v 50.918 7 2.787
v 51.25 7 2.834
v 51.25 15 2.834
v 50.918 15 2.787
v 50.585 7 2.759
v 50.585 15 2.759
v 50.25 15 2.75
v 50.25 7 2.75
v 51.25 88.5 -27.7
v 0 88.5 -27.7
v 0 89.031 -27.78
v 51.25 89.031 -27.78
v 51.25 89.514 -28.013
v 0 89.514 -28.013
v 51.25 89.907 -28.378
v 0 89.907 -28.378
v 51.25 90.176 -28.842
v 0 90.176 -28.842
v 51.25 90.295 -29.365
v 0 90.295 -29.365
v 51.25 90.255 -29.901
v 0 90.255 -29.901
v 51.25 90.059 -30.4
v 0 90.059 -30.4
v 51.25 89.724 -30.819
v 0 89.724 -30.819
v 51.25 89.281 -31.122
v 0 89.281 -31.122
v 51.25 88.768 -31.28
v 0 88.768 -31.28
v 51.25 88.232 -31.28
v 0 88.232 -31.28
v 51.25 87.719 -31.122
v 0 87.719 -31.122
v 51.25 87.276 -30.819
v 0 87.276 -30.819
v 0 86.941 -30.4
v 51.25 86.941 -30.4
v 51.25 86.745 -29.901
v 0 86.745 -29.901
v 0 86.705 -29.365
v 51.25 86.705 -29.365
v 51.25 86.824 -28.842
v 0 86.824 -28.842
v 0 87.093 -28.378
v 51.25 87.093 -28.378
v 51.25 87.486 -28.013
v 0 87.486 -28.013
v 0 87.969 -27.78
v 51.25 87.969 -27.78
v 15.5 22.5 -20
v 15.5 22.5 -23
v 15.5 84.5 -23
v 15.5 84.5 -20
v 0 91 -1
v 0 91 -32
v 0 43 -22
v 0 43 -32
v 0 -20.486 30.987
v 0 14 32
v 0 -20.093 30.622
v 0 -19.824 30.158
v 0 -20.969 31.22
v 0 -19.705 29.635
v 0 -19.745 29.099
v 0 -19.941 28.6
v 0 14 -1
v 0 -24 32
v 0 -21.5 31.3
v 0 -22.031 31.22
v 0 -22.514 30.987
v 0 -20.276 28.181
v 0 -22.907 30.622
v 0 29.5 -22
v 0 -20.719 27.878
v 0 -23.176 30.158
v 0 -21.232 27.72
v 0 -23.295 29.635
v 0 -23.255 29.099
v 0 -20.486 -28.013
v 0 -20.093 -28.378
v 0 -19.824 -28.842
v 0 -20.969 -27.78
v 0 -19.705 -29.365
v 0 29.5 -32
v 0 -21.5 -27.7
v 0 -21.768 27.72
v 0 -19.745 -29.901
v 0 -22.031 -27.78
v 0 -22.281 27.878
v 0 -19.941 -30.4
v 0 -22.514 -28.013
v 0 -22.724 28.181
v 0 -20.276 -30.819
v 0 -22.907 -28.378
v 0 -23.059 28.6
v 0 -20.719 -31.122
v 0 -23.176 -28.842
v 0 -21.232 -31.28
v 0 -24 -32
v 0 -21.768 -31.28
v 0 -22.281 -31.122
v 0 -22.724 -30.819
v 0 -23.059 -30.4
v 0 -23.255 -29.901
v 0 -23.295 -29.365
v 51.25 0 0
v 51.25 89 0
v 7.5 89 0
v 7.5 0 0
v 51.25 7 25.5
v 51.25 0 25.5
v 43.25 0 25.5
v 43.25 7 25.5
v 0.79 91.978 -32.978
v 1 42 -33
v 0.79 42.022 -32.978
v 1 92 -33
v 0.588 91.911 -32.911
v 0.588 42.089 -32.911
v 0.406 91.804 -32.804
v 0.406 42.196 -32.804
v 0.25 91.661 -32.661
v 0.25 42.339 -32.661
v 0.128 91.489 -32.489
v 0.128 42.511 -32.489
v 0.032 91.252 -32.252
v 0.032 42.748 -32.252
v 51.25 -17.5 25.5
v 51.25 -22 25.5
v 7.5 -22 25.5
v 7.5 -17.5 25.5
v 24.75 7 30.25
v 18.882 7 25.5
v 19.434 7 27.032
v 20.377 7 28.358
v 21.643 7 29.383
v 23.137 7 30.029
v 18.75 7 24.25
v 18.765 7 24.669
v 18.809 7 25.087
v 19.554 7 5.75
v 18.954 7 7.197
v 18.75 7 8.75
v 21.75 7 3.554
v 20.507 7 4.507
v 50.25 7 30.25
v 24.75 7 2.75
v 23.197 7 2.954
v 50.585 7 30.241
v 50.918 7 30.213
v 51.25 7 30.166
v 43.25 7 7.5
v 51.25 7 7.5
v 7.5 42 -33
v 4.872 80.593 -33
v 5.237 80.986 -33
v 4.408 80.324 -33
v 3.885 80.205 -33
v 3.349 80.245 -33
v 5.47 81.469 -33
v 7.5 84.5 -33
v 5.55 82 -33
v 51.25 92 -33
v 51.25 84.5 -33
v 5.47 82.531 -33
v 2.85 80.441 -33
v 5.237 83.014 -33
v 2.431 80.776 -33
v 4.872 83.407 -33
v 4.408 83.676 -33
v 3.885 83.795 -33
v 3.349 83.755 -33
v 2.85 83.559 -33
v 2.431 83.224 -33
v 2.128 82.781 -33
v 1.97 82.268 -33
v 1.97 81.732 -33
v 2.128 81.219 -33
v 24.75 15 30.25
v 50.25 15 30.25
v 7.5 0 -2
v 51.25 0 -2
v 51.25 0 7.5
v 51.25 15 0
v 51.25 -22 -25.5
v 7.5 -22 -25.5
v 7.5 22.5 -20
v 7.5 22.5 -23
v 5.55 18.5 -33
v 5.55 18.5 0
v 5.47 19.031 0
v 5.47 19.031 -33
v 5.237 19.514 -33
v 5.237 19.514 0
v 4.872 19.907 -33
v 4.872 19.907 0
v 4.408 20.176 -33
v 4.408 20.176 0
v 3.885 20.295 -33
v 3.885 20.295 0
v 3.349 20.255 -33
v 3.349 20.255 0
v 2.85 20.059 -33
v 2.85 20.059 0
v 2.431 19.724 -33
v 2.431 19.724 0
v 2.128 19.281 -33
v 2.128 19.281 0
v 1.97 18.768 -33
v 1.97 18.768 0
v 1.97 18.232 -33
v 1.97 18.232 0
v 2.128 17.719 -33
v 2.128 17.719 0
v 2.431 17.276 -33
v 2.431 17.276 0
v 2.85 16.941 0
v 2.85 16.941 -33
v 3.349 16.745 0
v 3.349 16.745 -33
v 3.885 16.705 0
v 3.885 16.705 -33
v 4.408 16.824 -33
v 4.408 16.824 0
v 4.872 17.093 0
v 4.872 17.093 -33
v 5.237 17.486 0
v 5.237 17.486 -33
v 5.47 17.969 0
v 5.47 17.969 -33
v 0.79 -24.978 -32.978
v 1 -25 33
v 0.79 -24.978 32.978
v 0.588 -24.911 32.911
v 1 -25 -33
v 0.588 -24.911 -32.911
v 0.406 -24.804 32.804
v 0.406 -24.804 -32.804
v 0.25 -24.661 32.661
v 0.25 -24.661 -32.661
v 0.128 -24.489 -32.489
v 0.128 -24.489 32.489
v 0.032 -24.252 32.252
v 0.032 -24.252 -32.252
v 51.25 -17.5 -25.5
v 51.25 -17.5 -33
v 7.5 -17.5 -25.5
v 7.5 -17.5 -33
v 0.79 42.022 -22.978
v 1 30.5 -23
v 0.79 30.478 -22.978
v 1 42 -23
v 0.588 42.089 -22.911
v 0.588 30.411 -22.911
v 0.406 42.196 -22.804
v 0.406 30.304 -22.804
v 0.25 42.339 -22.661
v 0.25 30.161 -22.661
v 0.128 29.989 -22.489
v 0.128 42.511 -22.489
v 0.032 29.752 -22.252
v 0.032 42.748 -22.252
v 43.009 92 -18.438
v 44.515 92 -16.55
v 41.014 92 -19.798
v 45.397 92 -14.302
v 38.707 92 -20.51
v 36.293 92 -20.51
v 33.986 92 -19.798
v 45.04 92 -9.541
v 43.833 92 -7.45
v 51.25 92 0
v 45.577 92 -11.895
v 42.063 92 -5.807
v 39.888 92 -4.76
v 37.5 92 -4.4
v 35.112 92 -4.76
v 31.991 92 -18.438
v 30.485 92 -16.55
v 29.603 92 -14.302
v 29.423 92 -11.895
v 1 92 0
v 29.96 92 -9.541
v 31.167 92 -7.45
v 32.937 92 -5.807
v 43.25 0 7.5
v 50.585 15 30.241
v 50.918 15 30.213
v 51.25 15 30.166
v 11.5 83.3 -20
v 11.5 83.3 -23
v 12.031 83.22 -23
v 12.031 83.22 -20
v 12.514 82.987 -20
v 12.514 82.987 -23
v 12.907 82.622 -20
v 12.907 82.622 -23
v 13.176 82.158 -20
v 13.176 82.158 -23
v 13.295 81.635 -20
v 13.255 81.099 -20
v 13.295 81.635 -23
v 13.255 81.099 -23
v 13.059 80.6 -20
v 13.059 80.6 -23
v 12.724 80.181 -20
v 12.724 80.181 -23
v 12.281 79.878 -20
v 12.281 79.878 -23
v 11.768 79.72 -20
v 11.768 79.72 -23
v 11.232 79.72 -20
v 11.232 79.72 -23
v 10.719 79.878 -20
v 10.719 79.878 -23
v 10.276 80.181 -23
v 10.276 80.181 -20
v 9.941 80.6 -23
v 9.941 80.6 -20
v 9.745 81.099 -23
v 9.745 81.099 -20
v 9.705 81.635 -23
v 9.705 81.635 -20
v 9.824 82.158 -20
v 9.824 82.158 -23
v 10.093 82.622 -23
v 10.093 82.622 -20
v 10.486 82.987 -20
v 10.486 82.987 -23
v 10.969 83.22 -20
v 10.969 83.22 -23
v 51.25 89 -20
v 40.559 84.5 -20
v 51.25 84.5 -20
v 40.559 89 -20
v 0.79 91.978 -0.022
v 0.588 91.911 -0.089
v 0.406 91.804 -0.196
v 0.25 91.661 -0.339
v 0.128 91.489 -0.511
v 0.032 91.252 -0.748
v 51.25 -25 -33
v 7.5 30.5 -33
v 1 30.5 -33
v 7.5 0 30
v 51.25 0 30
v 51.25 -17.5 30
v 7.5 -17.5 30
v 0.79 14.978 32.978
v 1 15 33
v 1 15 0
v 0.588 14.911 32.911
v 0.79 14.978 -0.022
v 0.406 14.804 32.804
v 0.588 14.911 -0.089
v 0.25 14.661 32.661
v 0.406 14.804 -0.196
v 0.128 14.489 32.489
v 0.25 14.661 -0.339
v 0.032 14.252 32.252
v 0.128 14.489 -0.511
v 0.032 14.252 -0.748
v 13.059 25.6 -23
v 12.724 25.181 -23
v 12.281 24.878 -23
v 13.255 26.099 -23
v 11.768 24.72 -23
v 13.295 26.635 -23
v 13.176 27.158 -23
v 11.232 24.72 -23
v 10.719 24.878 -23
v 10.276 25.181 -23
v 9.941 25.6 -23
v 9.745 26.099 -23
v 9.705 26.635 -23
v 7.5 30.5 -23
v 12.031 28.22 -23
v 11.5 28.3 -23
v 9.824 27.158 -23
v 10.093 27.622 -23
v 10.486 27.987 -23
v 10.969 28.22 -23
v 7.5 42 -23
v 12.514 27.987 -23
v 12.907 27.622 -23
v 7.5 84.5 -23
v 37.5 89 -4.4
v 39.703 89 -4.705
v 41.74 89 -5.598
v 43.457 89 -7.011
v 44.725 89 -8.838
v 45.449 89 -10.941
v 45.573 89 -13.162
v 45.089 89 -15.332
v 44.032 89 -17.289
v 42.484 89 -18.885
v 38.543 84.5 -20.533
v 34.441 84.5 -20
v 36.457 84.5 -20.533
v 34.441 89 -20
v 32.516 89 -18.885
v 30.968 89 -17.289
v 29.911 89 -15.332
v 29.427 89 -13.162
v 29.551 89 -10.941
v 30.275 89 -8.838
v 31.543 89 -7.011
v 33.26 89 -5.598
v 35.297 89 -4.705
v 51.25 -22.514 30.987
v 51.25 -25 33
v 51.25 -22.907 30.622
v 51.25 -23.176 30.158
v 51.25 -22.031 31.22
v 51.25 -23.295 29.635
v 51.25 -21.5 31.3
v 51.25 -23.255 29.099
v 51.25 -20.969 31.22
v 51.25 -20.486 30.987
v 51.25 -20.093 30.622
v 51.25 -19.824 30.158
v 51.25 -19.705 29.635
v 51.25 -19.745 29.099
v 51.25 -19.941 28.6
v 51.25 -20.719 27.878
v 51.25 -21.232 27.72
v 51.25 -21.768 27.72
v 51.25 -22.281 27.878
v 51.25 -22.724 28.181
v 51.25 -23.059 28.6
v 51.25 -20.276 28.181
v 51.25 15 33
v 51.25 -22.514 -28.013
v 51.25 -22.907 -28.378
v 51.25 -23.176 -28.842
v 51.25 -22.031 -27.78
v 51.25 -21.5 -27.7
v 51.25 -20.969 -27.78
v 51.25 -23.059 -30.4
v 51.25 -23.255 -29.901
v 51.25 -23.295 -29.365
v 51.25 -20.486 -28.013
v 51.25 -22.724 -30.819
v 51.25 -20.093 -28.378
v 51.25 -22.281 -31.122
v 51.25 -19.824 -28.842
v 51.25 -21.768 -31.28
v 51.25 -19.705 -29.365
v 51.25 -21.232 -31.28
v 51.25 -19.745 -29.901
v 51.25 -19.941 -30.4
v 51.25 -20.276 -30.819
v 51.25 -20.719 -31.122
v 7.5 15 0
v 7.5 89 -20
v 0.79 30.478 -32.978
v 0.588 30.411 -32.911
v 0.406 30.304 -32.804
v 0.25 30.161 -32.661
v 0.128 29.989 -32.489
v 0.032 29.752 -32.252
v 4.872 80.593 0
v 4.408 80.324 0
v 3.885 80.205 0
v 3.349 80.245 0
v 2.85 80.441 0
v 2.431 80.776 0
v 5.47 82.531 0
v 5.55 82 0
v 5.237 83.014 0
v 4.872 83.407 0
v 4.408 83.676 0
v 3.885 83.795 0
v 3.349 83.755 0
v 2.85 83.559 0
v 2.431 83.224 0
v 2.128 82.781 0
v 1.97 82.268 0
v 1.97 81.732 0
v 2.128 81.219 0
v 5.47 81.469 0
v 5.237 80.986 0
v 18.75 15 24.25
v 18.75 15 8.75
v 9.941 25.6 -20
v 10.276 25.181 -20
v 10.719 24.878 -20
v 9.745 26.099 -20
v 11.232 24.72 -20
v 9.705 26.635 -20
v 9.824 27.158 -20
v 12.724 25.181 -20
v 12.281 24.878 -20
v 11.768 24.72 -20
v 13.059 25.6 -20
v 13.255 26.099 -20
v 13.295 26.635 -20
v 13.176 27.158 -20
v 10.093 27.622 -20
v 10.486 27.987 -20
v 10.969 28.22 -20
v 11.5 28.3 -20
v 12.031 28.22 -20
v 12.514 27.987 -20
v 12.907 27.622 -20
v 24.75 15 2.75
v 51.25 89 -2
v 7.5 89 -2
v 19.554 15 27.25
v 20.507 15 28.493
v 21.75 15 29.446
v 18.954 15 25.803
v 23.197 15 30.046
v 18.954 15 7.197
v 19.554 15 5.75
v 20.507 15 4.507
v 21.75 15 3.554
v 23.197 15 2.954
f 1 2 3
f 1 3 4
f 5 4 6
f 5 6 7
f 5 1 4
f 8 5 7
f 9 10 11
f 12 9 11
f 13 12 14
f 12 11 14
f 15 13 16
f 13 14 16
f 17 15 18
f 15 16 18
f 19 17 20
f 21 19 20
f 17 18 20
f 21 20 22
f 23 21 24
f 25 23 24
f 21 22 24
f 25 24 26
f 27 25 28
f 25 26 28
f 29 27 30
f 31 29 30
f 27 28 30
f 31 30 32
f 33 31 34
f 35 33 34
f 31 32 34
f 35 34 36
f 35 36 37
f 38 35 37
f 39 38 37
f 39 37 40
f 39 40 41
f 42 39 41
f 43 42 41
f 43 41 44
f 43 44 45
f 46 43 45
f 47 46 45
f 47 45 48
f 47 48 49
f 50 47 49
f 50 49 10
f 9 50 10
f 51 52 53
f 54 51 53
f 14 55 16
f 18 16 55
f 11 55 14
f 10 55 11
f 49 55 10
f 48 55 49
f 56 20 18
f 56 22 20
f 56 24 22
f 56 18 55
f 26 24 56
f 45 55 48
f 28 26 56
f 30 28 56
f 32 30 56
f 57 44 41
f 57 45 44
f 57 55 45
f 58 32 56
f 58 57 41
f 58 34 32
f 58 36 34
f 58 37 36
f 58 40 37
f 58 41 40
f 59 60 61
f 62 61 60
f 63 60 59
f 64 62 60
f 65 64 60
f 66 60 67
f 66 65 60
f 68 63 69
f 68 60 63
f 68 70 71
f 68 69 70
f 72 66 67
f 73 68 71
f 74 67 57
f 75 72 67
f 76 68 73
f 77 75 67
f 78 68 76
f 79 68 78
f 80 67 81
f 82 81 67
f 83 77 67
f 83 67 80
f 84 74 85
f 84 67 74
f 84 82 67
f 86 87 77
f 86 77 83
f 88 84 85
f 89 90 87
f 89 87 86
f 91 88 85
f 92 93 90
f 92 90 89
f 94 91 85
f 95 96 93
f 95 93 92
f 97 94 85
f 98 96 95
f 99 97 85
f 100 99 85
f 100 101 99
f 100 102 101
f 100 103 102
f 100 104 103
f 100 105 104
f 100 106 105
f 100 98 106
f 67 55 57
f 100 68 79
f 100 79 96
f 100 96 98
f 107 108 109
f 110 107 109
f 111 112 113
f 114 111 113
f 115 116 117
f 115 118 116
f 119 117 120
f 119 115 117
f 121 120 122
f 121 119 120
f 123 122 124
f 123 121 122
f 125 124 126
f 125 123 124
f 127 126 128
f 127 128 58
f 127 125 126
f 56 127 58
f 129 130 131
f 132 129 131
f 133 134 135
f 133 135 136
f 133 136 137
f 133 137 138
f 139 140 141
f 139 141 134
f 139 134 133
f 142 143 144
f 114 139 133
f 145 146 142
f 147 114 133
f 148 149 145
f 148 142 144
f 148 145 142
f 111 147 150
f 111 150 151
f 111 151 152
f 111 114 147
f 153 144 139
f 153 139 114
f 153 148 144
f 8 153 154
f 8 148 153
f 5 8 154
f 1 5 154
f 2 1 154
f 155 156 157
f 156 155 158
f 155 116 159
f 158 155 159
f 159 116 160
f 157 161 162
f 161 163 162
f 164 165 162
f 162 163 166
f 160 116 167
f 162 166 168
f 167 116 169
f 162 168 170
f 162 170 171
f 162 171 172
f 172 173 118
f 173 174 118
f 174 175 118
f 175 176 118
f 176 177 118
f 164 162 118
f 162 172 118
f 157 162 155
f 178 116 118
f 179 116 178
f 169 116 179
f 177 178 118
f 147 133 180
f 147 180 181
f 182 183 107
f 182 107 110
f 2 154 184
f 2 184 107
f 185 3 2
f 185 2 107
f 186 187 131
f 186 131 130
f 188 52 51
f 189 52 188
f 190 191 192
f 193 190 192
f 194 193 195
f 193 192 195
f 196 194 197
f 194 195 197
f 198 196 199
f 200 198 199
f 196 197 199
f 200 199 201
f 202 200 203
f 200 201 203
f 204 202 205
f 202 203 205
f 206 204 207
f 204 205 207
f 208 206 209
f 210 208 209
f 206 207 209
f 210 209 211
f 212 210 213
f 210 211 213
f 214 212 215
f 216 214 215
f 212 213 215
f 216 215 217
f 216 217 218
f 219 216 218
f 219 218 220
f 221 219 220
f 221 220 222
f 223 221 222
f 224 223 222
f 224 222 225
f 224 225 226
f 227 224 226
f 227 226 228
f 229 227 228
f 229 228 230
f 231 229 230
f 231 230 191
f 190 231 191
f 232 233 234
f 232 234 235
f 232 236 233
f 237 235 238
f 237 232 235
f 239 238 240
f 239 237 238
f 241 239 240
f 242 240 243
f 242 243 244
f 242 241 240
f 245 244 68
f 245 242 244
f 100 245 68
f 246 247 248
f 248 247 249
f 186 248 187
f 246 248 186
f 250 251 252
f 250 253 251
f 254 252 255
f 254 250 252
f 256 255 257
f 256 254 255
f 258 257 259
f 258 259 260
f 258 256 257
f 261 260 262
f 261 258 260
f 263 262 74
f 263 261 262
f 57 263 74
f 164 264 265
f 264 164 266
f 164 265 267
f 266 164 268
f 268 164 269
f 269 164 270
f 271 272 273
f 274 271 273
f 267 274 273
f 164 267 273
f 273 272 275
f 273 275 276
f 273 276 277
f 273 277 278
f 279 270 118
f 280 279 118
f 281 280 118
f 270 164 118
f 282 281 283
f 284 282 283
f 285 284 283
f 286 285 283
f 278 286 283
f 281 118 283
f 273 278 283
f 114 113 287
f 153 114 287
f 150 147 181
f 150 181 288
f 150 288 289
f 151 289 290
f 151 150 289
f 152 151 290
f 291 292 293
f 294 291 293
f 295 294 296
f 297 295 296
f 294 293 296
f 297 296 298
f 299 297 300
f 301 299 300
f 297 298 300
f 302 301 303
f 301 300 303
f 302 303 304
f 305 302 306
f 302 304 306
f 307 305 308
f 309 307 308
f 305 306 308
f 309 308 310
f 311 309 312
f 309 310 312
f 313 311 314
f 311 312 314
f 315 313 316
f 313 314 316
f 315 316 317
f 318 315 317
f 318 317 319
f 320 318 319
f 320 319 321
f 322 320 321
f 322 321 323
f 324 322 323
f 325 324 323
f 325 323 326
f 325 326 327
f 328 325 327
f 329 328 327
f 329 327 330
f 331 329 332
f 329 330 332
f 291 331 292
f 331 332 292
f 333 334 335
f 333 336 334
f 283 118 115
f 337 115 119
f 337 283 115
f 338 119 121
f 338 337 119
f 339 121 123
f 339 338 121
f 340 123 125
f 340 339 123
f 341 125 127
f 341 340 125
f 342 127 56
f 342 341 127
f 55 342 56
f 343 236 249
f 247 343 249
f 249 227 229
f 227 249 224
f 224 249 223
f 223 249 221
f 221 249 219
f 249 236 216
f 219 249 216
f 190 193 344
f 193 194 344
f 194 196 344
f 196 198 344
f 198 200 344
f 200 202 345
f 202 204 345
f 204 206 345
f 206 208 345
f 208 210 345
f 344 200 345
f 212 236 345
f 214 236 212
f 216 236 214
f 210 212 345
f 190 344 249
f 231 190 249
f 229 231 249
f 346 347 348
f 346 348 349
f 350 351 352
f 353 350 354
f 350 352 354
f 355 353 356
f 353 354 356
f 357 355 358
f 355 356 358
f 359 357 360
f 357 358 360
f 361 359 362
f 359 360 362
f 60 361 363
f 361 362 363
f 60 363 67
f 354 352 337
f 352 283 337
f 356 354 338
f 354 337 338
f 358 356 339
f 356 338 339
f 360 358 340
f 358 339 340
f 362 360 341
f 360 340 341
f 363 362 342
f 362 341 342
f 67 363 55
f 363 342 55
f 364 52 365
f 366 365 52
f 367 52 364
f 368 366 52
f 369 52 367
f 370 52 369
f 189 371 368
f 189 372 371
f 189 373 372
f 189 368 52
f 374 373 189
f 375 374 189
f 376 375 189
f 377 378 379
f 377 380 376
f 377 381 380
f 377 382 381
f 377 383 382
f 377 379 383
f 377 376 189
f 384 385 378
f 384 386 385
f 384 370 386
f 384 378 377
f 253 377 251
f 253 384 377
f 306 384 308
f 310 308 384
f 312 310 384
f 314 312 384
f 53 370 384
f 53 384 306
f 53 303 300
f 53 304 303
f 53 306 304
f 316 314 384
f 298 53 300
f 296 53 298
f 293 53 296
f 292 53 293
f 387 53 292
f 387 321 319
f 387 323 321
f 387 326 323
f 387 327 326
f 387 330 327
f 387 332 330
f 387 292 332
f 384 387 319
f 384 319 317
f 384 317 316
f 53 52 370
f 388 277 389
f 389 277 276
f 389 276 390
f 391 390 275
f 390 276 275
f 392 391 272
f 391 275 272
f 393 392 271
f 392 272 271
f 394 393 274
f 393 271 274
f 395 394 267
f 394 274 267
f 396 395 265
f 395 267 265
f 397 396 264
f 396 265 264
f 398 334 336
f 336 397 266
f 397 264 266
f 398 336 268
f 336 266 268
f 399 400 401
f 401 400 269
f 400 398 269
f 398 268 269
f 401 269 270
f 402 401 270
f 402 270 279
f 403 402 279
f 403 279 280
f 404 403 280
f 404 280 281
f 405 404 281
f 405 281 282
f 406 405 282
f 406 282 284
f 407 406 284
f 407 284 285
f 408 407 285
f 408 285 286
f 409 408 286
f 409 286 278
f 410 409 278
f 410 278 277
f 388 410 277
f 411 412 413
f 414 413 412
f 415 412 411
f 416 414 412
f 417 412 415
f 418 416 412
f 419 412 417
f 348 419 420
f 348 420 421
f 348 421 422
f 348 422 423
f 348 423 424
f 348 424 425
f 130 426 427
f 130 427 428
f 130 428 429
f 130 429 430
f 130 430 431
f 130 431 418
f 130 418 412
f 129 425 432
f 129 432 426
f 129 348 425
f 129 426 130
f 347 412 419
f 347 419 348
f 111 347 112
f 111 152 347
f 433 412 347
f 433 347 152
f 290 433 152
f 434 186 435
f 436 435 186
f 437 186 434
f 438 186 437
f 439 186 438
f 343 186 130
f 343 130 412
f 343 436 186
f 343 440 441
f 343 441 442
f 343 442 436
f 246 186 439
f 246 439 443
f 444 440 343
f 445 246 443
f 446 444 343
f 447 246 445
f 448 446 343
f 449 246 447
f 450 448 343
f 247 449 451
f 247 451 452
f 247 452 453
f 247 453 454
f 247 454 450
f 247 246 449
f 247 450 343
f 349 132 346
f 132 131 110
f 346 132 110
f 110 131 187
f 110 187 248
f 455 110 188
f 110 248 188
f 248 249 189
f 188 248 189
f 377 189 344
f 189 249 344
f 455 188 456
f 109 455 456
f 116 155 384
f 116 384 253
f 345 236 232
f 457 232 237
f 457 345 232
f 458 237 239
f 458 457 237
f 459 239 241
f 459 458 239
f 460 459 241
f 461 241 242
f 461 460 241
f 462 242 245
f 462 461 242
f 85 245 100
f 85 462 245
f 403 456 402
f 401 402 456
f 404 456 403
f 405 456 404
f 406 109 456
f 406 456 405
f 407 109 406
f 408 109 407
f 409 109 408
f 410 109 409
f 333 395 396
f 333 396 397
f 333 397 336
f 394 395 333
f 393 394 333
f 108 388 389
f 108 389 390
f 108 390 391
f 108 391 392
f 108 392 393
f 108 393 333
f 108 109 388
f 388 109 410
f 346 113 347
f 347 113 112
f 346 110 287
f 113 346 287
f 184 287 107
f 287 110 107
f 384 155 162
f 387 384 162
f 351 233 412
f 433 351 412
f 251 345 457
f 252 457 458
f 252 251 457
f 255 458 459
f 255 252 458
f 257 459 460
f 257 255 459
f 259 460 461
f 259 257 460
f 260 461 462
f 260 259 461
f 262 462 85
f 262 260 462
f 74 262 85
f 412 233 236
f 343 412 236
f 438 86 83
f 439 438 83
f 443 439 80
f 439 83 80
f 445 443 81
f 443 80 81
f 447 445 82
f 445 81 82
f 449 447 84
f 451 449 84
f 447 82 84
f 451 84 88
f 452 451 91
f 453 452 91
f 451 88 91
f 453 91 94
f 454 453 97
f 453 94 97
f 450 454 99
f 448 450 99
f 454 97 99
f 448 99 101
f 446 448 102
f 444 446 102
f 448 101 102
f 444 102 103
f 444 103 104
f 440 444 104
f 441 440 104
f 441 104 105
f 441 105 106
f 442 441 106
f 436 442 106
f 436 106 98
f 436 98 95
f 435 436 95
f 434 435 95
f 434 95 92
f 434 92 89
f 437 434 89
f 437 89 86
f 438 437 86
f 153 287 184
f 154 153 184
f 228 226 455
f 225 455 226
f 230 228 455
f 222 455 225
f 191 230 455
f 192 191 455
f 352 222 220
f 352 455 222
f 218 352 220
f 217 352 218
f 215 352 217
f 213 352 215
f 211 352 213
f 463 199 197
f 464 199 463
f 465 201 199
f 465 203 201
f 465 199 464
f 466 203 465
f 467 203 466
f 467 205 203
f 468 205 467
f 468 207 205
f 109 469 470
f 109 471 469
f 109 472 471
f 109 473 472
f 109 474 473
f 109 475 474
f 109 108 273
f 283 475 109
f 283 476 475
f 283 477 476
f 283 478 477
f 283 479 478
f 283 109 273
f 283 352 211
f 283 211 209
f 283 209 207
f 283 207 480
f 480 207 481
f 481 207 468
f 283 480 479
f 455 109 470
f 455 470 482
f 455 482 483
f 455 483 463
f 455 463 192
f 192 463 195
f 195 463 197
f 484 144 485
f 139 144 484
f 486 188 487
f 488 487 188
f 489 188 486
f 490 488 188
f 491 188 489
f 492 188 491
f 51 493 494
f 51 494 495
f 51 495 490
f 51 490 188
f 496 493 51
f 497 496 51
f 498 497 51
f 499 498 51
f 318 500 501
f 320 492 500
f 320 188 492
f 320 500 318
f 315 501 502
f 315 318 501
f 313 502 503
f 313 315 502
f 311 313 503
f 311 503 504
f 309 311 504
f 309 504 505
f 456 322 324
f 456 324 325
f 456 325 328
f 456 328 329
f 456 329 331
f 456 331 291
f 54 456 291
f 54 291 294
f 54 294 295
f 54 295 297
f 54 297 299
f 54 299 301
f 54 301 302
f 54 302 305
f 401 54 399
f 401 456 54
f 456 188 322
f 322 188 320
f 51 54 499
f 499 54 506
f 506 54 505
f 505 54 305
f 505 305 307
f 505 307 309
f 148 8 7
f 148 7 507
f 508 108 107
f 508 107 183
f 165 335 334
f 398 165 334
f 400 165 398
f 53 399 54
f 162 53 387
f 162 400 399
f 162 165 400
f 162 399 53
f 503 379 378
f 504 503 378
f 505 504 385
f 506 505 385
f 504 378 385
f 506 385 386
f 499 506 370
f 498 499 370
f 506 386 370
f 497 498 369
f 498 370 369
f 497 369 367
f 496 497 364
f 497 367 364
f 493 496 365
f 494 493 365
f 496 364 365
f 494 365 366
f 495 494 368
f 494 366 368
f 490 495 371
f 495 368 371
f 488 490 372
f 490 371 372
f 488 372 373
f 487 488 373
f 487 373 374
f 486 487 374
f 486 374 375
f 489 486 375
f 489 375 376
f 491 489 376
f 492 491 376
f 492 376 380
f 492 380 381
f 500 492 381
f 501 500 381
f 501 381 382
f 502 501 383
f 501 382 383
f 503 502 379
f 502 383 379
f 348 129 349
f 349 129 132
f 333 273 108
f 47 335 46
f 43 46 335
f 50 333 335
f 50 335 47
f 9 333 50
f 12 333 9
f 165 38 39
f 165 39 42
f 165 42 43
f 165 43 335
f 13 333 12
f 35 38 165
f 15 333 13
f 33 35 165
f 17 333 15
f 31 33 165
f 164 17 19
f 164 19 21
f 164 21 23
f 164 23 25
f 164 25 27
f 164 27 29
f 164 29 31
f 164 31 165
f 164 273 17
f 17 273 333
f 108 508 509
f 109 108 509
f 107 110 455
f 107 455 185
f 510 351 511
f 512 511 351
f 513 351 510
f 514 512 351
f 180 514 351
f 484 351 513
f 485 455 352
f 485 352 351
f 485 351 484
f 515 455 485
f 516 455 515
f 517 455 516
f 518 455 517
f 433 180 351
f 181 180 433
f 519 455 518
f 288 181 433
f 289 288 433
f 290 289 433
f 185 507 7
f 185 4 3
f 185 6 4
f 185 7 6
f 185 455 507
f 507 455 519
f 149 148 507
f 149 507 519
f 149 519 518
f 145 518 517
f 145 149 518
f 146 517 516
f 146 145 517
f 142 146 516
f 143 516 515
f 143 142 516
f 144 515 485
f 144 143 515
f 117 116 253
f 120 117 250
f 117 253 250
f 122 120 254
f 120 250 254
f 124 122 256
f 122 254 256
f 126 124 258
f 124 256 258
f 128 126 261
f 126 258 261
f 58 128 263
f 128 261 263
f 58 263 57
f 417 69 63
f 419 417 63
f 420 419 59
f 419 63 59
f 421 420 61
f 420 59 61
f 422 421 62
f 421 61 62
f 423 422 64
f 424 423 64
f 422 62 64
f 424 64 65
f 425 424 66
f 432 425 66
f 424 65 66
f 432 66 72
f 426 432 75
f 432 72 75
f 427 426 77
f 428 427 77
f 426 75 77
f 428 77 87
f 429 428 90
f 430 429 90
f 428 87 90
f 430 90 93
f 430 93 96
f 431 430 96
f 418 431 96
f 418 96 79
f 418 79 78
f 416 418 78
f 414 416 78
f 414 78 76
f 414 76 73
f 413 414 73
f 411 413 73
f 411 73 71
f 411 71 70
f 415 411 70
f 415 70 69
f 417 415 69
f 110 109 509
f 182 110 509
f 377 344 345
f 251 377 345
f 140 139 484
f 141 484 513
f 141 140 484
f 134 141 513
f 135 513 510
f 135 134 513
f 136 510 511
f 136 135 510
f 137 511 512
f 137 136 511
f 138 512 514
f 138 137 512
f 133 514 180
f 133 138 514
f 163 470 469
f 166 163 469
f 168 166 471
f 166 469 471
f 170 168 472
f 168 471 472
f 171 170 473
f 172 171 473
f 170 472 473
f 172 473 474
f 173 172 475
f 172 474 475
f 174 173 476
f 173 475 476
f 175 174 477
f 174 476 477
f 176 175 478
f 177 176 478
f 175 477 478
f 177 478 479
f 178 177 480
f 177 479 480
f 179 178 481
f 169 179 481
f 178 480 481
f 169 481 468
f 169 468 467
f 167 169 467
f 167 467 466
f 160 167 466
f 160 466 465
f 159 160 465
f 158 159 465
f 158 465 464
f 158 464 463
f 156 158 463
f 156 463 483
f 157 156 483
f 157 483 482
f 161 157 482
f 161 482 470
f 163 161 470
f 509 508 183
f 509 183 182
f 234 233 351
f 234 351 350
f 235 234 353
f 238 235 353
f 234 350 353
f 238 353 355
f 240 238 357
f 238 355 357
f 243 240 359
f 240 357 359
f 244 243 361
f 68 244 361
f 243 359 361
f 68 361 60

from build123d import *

# Parameters (mm, degrees)
SKETCH_1_W           = 33
SKETCH_1_H           = 25
SKETCH_1_W_2         = 23
SKETCH_1_H_2         = 117
SKETCH_1_W_3         = 10
EXTRUDE_1_DEPTH      = 77
SKETCH_2_W           = 62
SKETCH_2_H           = 62
CUT_EXTRUDE_1_DEPTH  = 10
SKETCH_3_R           = 8.1
CUT_EXTRUDE_2_DEPTH  = 10
SKETCH_4_W           = 62
SKETCH_4_H           = 40
CUT_EXTRUDE_3_DEPTH  = 58.5
SKETCH_5_W           = 77
SKETCH_5_H           = 33
EXTRUDE_2_DEPTH      = 15
EXTRUDE_3_DEPTH      = 7
SKETCH_7_W           = 62
SKETCH_7_H           = 66.5
CUT_EXTRUDE_4_DEPTH  = 20
SKETCH_8_W           = 62
SKETCH_8_H           = 2
EXTRUDE_4_DEPTH      = 89
SKETCH_9_R           = 1.8
CUT_EXTRUDE_5_DEPTH  = 125.426685241
SKETCH_10_R          = 1.8
CUT_EXTRUDE_6_DEPTH  = 125.426685241
SKETCH_12_R          = 1.8
CUT_EXTRUDE_7_DEPTH  = 3
SKETCH_13_W          = 7.5
SKETCH_13_H          = 11.5
CUT_EXTRUDE_8_DEPTH  = 10
CUT_EXTRUDE_9_DEPTH  = 25.75
SKETCH_17_W          = 43.75
SKETCH_17_H          = 51
CUT_EXTRUDE_11_DEPTH = 4.5
SKETCH_18_W          = 43.75
SKETCH_18_H          = 17.5
CUT_EXTRUDE_12_DEPTH = 4.5
SKETCH_19_W          = 35.75
SKETCH_19_H          = 62
CUT_EXTRUDE_13_DEPTH = 3
FILLET_1_R           = 1


with BuildPart() as part:
    # Sketch 1 → Extrude 1 (new body)
    with BuildSketch(Plane(origin=(0, 0, 0), x_dir=(0, 0, -1), z_dir=(1, 0, 0))):
        with Locations((-16.5, -12.5)):
            Rectangle(SKETCH_1_W, SKETCH_1_H)
        with Locations((11.5, 33.5)):
            Rectangle(SKETCH_1_W_2, SKETCH_1_H_2)
        with Locations((28, 33.5)):
            Rectangle(SKETCH_1_W_3, SKETCH_1_H_2)
    extrude(amount=EXTRUDE_1_DEPTH)

    # Sketch 2 → Cut-Extrude 1 (cut)
    with BuildSketch(Plane(origin=(0, 0, -33), x_dir=(-1, 0, 0), z_dir=(0, 0, -1))):
        with Locations((-38.5, 53.5)):
            Rectangle(SKETCH_2_W, SKETCH_2_H)
    extrude(amount=-CUT_EXTRUDE_1_DEPTH, mode=Mode.SUBTRACT)

    # Sketch 3 → Cut-Extrude 2 (cut)
    with BuildSketch(Plane(origin=(0, 92, 0), x_dir=(1, 0, 0), z_dir=(0, 1, 0))):
        with Locations(Location((37.5, 12.5, 0), (0, 0, 270))):
            Circle(SKETCH_3_R)
    extrude(amount=-CUT_EXTRUDE_2_DEPTH, mode=Mode.SUBTRACT)

    # Sketch 4 → Cut-Extrude 3 (cut)
    with BuildSketch(Plane(origin=(0, 0, -33), x_dir=(-1, 0, 0), z_dir=(0, 0, -1))):
        with Locations((-38.5, 2.5)):
            Rectangle(SKETCH_4_W, SKETCH_4_H)
    extrude(amount=-CUT_EXTRUDE_3_DEPTH, mode=Mode.SUBTRACT)

    # Sketch 5 → Extrude 2 (add)
    with BuildSketch(Plane(origin=(0, 0, 0), x_dir=(1, 0, 0), z_dir=(0, 1, 0))):
        with Locations((38.5, -16.5)):
            Rectangle(SKETCH_5_W, SKETCH_5_H)
        with BuildLine():
            Line((50.25, -2.75), (24.75, -2.75))
            ThreePointArc((24.75, -2.75), (20.507359313, -4.507359313), (18.75, -8.75))
            Line((18.75, -8.75), (18.75, -24.25))
            ThreePointArc((18.75, -24.25), (20.507359313, -28.492640687), (24.75, -30.25))
            Line((24.75, -30.25), (50.25, -30.25))
            ThreePointArc((50.25, -30.25), (54.492640687, -28.492640687), (56.25, -24.25))
            Line((56.25, -24.25), (56.25, -8.75))
            ThreePointArc((56.25, -8.75), (54.492640687, -4.507359313), (50.25, -2.75))
        make_face(mode=Mode.SUBTRACT)
    extrude(amount=EXTRUDE_2_DEPTH)

    # Sketch 6 → Extrude 3 (add)
    with BuildSketch(Plane(origin=(0, 0, 0), x_dir=(1, 0, 0), z_dir=(0, 1, 0))):
        with BuildLine():
            Line((18.881652703, -25.5), (43.25, -25.5))
            Line((43.25, -25.5), (43.25, -7.5))
            Line((43.25, -7.5), (43.25, -2.75))
            Line((43.25, -2.75), (24.75, -2.75))
            ThreePointArc((24.75, -2.75), (20.507359313, -4.507359313), (18.75, -8.75))
            Line((18.75, -8.75), (18.75, -24.25))
            ThreePointArc((18.75, -24.25), (18.783003947, -24.878456927), (18.881652703, -25.5))
        make_face()
        with BuildLine():
            Line((24.75, -30.25), (43.25, -30.25))
            Line((43.25, -30.25), (43.25, -25.5))
            Line((43.25, -25.5), (18.881652703, -25.5))
            ThreePointArc((18.881652703, -25.5), (20.975082782, -28.913689527), (24.75, -30.25))
        make_face()
        with BuildLine():
            Line((43.25, -25.5), (43.25, -30.25))
            Line((43.25, -30.25), (50.25, -30.25))
            ThreePointArc((50.25, -30.25), (50.751757562, -30.228983137), (51.25, -30.166079783))
            Line((51.25, -30.166079783), (51.25, -25.5))
            Line((51.25, -25.5), (43.25, -25.5))
        make_face()
        with BuildLine():
            Line((51.25, -7.5), (51.25, -25.5))
            Line((51.25, -25.5), (56.118347297, -25.5))
            ThreePointArc((56.118347297, -25.5), (56.216996053, -24.878456927), (56.25, -24.25))
            Line((56.25, -24.25), (56.25, -8.75))
            ThreePointArc((56.25, -8.75), (54.832575695, -4.877016654), (51.25, -2.833920217))
            Line((51.25, -2.833920217), (51.25, -7.5))
        make_face()
        with BuildLine():
            Line((56.118347297, -25.5), (51.25, -25.5))
            Line((51.25, -25.5), (51.25, -30.166079783))
            ThreePointArc((51.25, -30.166079783), (54.401701312, -28.581671296), (56.118347297, -25.5))
        make_face()
        with BuildLine():
            Line((43.25, -2.75), (43.25, -7.5))
            Line((43.25, -7.5), (51.25, -7.5))
            Line((51.25, -7.5), (51.25, -2.833920217))
            ThreePointArc((51.25, -2.833920217), (50.751757562, -2.771016863), (50.25, -2.75))
            Line((50.25, -2.75), (43.25, -2.75))
        make_face()
    extrude(amount=EXTRUDE_3_DEPTH)

    # Sketch 7 → Cut-Extrude 4 (cut)
    with BuildSketch(Plane.XY):
        with Locations((38.5, 55.75)):
            Rectangle(SKETCH_7_W, SKETCH_7_H)
    extrude(amount=-CUT_EXTRUDE_4_DEPTH, mode=Mode.SUBTRACT)

    # Sketch 9 → Cut-Extrude 5 (cut, through all)
    with BuildSketch(Plane.ZY):
        with Locations((-29.5, 88.5)):
            Circle(SKETCH_9_R)
        with Locations((-29.5, -21.5)):
            Circle(SKETCH_9_R)
        with Locations((29.5, -21.5)):
            Circle(SKETCH_9_R)
    extrude(amount=-CUT_EXTRUDE_5_DEPTH, mode=Mode.SUBTRACT)

    # Sketch 10 → Cut-Extrude 6 (cut, through all)
    with BuildSketch(Plane.XY):
        with Locations((3.75, 82)):
            Circle(SKETCH_10_R)
        with Locations((73.25, 82)):
            Circle(SKETCH_10_R)
        with Locations((73.25, 18.5)):
            Circle(SKETCH_10_R)
        with Locations((3.75, 18.5)):
            Circle(SKETCH_10_R)
    extrude(amount=-CUT_EXTRUDE_6_DEPTH, mode=Mode.SUBTRACT)

    # Sketch 12 → Cut-Extrude 7 (cut)
    with BuildSketch(Plane(origin=(0, 0, -23), x_dir=(-1, 0, 0), z_dir=(0, 0, -1))):
        with Locations(Location((-66.5, 81.5, 0), (0, 0, 90))):
            Circle(SKETCH_12_R)
        with Locations(Location((-11.5, 81.5, 0), (0, 0, 90))):
            Circle(SKETCH_12_R)
        with Locations(Location((-11.5, 26.5, 0), (0, 0, 90))):
            Circle(SKETCH_12_R)
        with Locations(Location((-66.5, 26.5, 0), (0, 0, 90))):
            Circle(SKETCH_12_R)
    extrude(amount=-CUT_EXTRUDE_7_DEPTH, mode=Mode.SUBTRACT)

    # Sketch 13 → Cut-Extrude 8 (cut)
    with BuildSketch(Plane(origin=(0, 0, -33), x_dir=(-1, 0, 0), z_dir=(0, 0, -1))):
        with Locations((-3.75, 36.25)):
            Rectangle(SKETCH_13_W, SKETCH_13_H)
    extrude(amount=-CUT_EXTRUDE_8_DEPTH, mode=Mode.SUBTRACT)


with BuildPart() as body_2:
    # Sketch 8 → Extrude 4 (new body)
    with BuildSketch(Plane(origin=(0, 89, 0), x_dir=(-1, 0, 0), z_dir=(0, -1, 0))):
        with Locations((-38.5, 1)):
            Rectangle(SKETCH_8_W, SKETCH_8_H)
    extrude(amount=EXTRUDE_4_DEPTH)


with BuildPart() as cut_extrude_9_tool:
    # Sketch 15 → Cut-Extrude 9 (new body)
    with BuildSketch(Plane(origin=(77, 0, 0), x_dir=(0, 0, -1), z_dir=(1, 0, 0))):
        Polygon((0, 15), (-33, 15), (-33, -25), (33, -25), (33, 92), (0, 92), align=None)
    extrude(amount=-CUT_EXTRUDE_9_DEPTH)


with BuildPart() as part_1:
    add(part.part)

    # Cut-Extrude 9: cut by cut_extrude_9_tool
    add(cut_extrude_9_tool.part, mode=Mode.SUBTRACT)

    # Sketch 17 → Cut-Extrude 11 (cut)
    with BuildSketch(Plane(origin=(0, -17.5, 0), x_dir=(1, 0, 0), z_dir=(0, 1, 0))):
        with Locations((29.375, 0)):
            Rectangle(SKETCH_17_W, SKETCH_17_H)
    extrude(amount=-CUT_EXTRUDE_11_DEPTH, mode=Mode.SUBTRACT)

    # Sketch 18 → Cut-Extrude 12 (cut)
    with BuildSketch(Plane(origin=(0, 0, 25.5), x_dir=(-1, 0, 0), z_dir=(0, 0, -1))):
        with Locations((-29.375, -8.75)):
            Rectangle(SKETCH_18_W, SKETCH_18_H)
    extrude(amount=-CUT_EXTRUDE_12_DEPTH, mode=Mode.SUBTRACT)

    # Sketch 19 → Cut-Extrude 13 (cut)
    with BuildSketch(Plane(origin=(0, 0, -23), x_dir=(-1, 0, 0), z_dir=(0, 0, -1))):
        with Locations((-33.375, 53.5)):
            Rectangle(SKETCH_19_W, SKETCH_19_H)
    extrude(amount=-CUT_EXTRUDE_13_DEPTH, mode=Mode.SUBTRACT)

    # Fillet 1
    fillet_1_edges = [part_1.edges().sort_by_distance(p)[0] for p in [
        (0, -5, 33),
        (0, 2.75, -33),
        (0, 36.25, -23),
        (0, 42, -28),
        (0, 30.5, -28),
        (0, 15, 16.5),
        (0, 53.5, 0),
        (0, 92, -16.5),
        (0, 67, -33),
        (0, -25, 0),
    ]]
    fillet(fillet_1_edges, radius=FILLET_1_R)


with BuildPart() as body_2_1:
    add(body_2.part)

    # Cut-Extrude 9: cut by cut_extrude_9_tool
    add(cut_extrude_9_tool.part, mode=Mode.SUBTRACT)


solid = Compound([part_1.part, body_2_1.part])
